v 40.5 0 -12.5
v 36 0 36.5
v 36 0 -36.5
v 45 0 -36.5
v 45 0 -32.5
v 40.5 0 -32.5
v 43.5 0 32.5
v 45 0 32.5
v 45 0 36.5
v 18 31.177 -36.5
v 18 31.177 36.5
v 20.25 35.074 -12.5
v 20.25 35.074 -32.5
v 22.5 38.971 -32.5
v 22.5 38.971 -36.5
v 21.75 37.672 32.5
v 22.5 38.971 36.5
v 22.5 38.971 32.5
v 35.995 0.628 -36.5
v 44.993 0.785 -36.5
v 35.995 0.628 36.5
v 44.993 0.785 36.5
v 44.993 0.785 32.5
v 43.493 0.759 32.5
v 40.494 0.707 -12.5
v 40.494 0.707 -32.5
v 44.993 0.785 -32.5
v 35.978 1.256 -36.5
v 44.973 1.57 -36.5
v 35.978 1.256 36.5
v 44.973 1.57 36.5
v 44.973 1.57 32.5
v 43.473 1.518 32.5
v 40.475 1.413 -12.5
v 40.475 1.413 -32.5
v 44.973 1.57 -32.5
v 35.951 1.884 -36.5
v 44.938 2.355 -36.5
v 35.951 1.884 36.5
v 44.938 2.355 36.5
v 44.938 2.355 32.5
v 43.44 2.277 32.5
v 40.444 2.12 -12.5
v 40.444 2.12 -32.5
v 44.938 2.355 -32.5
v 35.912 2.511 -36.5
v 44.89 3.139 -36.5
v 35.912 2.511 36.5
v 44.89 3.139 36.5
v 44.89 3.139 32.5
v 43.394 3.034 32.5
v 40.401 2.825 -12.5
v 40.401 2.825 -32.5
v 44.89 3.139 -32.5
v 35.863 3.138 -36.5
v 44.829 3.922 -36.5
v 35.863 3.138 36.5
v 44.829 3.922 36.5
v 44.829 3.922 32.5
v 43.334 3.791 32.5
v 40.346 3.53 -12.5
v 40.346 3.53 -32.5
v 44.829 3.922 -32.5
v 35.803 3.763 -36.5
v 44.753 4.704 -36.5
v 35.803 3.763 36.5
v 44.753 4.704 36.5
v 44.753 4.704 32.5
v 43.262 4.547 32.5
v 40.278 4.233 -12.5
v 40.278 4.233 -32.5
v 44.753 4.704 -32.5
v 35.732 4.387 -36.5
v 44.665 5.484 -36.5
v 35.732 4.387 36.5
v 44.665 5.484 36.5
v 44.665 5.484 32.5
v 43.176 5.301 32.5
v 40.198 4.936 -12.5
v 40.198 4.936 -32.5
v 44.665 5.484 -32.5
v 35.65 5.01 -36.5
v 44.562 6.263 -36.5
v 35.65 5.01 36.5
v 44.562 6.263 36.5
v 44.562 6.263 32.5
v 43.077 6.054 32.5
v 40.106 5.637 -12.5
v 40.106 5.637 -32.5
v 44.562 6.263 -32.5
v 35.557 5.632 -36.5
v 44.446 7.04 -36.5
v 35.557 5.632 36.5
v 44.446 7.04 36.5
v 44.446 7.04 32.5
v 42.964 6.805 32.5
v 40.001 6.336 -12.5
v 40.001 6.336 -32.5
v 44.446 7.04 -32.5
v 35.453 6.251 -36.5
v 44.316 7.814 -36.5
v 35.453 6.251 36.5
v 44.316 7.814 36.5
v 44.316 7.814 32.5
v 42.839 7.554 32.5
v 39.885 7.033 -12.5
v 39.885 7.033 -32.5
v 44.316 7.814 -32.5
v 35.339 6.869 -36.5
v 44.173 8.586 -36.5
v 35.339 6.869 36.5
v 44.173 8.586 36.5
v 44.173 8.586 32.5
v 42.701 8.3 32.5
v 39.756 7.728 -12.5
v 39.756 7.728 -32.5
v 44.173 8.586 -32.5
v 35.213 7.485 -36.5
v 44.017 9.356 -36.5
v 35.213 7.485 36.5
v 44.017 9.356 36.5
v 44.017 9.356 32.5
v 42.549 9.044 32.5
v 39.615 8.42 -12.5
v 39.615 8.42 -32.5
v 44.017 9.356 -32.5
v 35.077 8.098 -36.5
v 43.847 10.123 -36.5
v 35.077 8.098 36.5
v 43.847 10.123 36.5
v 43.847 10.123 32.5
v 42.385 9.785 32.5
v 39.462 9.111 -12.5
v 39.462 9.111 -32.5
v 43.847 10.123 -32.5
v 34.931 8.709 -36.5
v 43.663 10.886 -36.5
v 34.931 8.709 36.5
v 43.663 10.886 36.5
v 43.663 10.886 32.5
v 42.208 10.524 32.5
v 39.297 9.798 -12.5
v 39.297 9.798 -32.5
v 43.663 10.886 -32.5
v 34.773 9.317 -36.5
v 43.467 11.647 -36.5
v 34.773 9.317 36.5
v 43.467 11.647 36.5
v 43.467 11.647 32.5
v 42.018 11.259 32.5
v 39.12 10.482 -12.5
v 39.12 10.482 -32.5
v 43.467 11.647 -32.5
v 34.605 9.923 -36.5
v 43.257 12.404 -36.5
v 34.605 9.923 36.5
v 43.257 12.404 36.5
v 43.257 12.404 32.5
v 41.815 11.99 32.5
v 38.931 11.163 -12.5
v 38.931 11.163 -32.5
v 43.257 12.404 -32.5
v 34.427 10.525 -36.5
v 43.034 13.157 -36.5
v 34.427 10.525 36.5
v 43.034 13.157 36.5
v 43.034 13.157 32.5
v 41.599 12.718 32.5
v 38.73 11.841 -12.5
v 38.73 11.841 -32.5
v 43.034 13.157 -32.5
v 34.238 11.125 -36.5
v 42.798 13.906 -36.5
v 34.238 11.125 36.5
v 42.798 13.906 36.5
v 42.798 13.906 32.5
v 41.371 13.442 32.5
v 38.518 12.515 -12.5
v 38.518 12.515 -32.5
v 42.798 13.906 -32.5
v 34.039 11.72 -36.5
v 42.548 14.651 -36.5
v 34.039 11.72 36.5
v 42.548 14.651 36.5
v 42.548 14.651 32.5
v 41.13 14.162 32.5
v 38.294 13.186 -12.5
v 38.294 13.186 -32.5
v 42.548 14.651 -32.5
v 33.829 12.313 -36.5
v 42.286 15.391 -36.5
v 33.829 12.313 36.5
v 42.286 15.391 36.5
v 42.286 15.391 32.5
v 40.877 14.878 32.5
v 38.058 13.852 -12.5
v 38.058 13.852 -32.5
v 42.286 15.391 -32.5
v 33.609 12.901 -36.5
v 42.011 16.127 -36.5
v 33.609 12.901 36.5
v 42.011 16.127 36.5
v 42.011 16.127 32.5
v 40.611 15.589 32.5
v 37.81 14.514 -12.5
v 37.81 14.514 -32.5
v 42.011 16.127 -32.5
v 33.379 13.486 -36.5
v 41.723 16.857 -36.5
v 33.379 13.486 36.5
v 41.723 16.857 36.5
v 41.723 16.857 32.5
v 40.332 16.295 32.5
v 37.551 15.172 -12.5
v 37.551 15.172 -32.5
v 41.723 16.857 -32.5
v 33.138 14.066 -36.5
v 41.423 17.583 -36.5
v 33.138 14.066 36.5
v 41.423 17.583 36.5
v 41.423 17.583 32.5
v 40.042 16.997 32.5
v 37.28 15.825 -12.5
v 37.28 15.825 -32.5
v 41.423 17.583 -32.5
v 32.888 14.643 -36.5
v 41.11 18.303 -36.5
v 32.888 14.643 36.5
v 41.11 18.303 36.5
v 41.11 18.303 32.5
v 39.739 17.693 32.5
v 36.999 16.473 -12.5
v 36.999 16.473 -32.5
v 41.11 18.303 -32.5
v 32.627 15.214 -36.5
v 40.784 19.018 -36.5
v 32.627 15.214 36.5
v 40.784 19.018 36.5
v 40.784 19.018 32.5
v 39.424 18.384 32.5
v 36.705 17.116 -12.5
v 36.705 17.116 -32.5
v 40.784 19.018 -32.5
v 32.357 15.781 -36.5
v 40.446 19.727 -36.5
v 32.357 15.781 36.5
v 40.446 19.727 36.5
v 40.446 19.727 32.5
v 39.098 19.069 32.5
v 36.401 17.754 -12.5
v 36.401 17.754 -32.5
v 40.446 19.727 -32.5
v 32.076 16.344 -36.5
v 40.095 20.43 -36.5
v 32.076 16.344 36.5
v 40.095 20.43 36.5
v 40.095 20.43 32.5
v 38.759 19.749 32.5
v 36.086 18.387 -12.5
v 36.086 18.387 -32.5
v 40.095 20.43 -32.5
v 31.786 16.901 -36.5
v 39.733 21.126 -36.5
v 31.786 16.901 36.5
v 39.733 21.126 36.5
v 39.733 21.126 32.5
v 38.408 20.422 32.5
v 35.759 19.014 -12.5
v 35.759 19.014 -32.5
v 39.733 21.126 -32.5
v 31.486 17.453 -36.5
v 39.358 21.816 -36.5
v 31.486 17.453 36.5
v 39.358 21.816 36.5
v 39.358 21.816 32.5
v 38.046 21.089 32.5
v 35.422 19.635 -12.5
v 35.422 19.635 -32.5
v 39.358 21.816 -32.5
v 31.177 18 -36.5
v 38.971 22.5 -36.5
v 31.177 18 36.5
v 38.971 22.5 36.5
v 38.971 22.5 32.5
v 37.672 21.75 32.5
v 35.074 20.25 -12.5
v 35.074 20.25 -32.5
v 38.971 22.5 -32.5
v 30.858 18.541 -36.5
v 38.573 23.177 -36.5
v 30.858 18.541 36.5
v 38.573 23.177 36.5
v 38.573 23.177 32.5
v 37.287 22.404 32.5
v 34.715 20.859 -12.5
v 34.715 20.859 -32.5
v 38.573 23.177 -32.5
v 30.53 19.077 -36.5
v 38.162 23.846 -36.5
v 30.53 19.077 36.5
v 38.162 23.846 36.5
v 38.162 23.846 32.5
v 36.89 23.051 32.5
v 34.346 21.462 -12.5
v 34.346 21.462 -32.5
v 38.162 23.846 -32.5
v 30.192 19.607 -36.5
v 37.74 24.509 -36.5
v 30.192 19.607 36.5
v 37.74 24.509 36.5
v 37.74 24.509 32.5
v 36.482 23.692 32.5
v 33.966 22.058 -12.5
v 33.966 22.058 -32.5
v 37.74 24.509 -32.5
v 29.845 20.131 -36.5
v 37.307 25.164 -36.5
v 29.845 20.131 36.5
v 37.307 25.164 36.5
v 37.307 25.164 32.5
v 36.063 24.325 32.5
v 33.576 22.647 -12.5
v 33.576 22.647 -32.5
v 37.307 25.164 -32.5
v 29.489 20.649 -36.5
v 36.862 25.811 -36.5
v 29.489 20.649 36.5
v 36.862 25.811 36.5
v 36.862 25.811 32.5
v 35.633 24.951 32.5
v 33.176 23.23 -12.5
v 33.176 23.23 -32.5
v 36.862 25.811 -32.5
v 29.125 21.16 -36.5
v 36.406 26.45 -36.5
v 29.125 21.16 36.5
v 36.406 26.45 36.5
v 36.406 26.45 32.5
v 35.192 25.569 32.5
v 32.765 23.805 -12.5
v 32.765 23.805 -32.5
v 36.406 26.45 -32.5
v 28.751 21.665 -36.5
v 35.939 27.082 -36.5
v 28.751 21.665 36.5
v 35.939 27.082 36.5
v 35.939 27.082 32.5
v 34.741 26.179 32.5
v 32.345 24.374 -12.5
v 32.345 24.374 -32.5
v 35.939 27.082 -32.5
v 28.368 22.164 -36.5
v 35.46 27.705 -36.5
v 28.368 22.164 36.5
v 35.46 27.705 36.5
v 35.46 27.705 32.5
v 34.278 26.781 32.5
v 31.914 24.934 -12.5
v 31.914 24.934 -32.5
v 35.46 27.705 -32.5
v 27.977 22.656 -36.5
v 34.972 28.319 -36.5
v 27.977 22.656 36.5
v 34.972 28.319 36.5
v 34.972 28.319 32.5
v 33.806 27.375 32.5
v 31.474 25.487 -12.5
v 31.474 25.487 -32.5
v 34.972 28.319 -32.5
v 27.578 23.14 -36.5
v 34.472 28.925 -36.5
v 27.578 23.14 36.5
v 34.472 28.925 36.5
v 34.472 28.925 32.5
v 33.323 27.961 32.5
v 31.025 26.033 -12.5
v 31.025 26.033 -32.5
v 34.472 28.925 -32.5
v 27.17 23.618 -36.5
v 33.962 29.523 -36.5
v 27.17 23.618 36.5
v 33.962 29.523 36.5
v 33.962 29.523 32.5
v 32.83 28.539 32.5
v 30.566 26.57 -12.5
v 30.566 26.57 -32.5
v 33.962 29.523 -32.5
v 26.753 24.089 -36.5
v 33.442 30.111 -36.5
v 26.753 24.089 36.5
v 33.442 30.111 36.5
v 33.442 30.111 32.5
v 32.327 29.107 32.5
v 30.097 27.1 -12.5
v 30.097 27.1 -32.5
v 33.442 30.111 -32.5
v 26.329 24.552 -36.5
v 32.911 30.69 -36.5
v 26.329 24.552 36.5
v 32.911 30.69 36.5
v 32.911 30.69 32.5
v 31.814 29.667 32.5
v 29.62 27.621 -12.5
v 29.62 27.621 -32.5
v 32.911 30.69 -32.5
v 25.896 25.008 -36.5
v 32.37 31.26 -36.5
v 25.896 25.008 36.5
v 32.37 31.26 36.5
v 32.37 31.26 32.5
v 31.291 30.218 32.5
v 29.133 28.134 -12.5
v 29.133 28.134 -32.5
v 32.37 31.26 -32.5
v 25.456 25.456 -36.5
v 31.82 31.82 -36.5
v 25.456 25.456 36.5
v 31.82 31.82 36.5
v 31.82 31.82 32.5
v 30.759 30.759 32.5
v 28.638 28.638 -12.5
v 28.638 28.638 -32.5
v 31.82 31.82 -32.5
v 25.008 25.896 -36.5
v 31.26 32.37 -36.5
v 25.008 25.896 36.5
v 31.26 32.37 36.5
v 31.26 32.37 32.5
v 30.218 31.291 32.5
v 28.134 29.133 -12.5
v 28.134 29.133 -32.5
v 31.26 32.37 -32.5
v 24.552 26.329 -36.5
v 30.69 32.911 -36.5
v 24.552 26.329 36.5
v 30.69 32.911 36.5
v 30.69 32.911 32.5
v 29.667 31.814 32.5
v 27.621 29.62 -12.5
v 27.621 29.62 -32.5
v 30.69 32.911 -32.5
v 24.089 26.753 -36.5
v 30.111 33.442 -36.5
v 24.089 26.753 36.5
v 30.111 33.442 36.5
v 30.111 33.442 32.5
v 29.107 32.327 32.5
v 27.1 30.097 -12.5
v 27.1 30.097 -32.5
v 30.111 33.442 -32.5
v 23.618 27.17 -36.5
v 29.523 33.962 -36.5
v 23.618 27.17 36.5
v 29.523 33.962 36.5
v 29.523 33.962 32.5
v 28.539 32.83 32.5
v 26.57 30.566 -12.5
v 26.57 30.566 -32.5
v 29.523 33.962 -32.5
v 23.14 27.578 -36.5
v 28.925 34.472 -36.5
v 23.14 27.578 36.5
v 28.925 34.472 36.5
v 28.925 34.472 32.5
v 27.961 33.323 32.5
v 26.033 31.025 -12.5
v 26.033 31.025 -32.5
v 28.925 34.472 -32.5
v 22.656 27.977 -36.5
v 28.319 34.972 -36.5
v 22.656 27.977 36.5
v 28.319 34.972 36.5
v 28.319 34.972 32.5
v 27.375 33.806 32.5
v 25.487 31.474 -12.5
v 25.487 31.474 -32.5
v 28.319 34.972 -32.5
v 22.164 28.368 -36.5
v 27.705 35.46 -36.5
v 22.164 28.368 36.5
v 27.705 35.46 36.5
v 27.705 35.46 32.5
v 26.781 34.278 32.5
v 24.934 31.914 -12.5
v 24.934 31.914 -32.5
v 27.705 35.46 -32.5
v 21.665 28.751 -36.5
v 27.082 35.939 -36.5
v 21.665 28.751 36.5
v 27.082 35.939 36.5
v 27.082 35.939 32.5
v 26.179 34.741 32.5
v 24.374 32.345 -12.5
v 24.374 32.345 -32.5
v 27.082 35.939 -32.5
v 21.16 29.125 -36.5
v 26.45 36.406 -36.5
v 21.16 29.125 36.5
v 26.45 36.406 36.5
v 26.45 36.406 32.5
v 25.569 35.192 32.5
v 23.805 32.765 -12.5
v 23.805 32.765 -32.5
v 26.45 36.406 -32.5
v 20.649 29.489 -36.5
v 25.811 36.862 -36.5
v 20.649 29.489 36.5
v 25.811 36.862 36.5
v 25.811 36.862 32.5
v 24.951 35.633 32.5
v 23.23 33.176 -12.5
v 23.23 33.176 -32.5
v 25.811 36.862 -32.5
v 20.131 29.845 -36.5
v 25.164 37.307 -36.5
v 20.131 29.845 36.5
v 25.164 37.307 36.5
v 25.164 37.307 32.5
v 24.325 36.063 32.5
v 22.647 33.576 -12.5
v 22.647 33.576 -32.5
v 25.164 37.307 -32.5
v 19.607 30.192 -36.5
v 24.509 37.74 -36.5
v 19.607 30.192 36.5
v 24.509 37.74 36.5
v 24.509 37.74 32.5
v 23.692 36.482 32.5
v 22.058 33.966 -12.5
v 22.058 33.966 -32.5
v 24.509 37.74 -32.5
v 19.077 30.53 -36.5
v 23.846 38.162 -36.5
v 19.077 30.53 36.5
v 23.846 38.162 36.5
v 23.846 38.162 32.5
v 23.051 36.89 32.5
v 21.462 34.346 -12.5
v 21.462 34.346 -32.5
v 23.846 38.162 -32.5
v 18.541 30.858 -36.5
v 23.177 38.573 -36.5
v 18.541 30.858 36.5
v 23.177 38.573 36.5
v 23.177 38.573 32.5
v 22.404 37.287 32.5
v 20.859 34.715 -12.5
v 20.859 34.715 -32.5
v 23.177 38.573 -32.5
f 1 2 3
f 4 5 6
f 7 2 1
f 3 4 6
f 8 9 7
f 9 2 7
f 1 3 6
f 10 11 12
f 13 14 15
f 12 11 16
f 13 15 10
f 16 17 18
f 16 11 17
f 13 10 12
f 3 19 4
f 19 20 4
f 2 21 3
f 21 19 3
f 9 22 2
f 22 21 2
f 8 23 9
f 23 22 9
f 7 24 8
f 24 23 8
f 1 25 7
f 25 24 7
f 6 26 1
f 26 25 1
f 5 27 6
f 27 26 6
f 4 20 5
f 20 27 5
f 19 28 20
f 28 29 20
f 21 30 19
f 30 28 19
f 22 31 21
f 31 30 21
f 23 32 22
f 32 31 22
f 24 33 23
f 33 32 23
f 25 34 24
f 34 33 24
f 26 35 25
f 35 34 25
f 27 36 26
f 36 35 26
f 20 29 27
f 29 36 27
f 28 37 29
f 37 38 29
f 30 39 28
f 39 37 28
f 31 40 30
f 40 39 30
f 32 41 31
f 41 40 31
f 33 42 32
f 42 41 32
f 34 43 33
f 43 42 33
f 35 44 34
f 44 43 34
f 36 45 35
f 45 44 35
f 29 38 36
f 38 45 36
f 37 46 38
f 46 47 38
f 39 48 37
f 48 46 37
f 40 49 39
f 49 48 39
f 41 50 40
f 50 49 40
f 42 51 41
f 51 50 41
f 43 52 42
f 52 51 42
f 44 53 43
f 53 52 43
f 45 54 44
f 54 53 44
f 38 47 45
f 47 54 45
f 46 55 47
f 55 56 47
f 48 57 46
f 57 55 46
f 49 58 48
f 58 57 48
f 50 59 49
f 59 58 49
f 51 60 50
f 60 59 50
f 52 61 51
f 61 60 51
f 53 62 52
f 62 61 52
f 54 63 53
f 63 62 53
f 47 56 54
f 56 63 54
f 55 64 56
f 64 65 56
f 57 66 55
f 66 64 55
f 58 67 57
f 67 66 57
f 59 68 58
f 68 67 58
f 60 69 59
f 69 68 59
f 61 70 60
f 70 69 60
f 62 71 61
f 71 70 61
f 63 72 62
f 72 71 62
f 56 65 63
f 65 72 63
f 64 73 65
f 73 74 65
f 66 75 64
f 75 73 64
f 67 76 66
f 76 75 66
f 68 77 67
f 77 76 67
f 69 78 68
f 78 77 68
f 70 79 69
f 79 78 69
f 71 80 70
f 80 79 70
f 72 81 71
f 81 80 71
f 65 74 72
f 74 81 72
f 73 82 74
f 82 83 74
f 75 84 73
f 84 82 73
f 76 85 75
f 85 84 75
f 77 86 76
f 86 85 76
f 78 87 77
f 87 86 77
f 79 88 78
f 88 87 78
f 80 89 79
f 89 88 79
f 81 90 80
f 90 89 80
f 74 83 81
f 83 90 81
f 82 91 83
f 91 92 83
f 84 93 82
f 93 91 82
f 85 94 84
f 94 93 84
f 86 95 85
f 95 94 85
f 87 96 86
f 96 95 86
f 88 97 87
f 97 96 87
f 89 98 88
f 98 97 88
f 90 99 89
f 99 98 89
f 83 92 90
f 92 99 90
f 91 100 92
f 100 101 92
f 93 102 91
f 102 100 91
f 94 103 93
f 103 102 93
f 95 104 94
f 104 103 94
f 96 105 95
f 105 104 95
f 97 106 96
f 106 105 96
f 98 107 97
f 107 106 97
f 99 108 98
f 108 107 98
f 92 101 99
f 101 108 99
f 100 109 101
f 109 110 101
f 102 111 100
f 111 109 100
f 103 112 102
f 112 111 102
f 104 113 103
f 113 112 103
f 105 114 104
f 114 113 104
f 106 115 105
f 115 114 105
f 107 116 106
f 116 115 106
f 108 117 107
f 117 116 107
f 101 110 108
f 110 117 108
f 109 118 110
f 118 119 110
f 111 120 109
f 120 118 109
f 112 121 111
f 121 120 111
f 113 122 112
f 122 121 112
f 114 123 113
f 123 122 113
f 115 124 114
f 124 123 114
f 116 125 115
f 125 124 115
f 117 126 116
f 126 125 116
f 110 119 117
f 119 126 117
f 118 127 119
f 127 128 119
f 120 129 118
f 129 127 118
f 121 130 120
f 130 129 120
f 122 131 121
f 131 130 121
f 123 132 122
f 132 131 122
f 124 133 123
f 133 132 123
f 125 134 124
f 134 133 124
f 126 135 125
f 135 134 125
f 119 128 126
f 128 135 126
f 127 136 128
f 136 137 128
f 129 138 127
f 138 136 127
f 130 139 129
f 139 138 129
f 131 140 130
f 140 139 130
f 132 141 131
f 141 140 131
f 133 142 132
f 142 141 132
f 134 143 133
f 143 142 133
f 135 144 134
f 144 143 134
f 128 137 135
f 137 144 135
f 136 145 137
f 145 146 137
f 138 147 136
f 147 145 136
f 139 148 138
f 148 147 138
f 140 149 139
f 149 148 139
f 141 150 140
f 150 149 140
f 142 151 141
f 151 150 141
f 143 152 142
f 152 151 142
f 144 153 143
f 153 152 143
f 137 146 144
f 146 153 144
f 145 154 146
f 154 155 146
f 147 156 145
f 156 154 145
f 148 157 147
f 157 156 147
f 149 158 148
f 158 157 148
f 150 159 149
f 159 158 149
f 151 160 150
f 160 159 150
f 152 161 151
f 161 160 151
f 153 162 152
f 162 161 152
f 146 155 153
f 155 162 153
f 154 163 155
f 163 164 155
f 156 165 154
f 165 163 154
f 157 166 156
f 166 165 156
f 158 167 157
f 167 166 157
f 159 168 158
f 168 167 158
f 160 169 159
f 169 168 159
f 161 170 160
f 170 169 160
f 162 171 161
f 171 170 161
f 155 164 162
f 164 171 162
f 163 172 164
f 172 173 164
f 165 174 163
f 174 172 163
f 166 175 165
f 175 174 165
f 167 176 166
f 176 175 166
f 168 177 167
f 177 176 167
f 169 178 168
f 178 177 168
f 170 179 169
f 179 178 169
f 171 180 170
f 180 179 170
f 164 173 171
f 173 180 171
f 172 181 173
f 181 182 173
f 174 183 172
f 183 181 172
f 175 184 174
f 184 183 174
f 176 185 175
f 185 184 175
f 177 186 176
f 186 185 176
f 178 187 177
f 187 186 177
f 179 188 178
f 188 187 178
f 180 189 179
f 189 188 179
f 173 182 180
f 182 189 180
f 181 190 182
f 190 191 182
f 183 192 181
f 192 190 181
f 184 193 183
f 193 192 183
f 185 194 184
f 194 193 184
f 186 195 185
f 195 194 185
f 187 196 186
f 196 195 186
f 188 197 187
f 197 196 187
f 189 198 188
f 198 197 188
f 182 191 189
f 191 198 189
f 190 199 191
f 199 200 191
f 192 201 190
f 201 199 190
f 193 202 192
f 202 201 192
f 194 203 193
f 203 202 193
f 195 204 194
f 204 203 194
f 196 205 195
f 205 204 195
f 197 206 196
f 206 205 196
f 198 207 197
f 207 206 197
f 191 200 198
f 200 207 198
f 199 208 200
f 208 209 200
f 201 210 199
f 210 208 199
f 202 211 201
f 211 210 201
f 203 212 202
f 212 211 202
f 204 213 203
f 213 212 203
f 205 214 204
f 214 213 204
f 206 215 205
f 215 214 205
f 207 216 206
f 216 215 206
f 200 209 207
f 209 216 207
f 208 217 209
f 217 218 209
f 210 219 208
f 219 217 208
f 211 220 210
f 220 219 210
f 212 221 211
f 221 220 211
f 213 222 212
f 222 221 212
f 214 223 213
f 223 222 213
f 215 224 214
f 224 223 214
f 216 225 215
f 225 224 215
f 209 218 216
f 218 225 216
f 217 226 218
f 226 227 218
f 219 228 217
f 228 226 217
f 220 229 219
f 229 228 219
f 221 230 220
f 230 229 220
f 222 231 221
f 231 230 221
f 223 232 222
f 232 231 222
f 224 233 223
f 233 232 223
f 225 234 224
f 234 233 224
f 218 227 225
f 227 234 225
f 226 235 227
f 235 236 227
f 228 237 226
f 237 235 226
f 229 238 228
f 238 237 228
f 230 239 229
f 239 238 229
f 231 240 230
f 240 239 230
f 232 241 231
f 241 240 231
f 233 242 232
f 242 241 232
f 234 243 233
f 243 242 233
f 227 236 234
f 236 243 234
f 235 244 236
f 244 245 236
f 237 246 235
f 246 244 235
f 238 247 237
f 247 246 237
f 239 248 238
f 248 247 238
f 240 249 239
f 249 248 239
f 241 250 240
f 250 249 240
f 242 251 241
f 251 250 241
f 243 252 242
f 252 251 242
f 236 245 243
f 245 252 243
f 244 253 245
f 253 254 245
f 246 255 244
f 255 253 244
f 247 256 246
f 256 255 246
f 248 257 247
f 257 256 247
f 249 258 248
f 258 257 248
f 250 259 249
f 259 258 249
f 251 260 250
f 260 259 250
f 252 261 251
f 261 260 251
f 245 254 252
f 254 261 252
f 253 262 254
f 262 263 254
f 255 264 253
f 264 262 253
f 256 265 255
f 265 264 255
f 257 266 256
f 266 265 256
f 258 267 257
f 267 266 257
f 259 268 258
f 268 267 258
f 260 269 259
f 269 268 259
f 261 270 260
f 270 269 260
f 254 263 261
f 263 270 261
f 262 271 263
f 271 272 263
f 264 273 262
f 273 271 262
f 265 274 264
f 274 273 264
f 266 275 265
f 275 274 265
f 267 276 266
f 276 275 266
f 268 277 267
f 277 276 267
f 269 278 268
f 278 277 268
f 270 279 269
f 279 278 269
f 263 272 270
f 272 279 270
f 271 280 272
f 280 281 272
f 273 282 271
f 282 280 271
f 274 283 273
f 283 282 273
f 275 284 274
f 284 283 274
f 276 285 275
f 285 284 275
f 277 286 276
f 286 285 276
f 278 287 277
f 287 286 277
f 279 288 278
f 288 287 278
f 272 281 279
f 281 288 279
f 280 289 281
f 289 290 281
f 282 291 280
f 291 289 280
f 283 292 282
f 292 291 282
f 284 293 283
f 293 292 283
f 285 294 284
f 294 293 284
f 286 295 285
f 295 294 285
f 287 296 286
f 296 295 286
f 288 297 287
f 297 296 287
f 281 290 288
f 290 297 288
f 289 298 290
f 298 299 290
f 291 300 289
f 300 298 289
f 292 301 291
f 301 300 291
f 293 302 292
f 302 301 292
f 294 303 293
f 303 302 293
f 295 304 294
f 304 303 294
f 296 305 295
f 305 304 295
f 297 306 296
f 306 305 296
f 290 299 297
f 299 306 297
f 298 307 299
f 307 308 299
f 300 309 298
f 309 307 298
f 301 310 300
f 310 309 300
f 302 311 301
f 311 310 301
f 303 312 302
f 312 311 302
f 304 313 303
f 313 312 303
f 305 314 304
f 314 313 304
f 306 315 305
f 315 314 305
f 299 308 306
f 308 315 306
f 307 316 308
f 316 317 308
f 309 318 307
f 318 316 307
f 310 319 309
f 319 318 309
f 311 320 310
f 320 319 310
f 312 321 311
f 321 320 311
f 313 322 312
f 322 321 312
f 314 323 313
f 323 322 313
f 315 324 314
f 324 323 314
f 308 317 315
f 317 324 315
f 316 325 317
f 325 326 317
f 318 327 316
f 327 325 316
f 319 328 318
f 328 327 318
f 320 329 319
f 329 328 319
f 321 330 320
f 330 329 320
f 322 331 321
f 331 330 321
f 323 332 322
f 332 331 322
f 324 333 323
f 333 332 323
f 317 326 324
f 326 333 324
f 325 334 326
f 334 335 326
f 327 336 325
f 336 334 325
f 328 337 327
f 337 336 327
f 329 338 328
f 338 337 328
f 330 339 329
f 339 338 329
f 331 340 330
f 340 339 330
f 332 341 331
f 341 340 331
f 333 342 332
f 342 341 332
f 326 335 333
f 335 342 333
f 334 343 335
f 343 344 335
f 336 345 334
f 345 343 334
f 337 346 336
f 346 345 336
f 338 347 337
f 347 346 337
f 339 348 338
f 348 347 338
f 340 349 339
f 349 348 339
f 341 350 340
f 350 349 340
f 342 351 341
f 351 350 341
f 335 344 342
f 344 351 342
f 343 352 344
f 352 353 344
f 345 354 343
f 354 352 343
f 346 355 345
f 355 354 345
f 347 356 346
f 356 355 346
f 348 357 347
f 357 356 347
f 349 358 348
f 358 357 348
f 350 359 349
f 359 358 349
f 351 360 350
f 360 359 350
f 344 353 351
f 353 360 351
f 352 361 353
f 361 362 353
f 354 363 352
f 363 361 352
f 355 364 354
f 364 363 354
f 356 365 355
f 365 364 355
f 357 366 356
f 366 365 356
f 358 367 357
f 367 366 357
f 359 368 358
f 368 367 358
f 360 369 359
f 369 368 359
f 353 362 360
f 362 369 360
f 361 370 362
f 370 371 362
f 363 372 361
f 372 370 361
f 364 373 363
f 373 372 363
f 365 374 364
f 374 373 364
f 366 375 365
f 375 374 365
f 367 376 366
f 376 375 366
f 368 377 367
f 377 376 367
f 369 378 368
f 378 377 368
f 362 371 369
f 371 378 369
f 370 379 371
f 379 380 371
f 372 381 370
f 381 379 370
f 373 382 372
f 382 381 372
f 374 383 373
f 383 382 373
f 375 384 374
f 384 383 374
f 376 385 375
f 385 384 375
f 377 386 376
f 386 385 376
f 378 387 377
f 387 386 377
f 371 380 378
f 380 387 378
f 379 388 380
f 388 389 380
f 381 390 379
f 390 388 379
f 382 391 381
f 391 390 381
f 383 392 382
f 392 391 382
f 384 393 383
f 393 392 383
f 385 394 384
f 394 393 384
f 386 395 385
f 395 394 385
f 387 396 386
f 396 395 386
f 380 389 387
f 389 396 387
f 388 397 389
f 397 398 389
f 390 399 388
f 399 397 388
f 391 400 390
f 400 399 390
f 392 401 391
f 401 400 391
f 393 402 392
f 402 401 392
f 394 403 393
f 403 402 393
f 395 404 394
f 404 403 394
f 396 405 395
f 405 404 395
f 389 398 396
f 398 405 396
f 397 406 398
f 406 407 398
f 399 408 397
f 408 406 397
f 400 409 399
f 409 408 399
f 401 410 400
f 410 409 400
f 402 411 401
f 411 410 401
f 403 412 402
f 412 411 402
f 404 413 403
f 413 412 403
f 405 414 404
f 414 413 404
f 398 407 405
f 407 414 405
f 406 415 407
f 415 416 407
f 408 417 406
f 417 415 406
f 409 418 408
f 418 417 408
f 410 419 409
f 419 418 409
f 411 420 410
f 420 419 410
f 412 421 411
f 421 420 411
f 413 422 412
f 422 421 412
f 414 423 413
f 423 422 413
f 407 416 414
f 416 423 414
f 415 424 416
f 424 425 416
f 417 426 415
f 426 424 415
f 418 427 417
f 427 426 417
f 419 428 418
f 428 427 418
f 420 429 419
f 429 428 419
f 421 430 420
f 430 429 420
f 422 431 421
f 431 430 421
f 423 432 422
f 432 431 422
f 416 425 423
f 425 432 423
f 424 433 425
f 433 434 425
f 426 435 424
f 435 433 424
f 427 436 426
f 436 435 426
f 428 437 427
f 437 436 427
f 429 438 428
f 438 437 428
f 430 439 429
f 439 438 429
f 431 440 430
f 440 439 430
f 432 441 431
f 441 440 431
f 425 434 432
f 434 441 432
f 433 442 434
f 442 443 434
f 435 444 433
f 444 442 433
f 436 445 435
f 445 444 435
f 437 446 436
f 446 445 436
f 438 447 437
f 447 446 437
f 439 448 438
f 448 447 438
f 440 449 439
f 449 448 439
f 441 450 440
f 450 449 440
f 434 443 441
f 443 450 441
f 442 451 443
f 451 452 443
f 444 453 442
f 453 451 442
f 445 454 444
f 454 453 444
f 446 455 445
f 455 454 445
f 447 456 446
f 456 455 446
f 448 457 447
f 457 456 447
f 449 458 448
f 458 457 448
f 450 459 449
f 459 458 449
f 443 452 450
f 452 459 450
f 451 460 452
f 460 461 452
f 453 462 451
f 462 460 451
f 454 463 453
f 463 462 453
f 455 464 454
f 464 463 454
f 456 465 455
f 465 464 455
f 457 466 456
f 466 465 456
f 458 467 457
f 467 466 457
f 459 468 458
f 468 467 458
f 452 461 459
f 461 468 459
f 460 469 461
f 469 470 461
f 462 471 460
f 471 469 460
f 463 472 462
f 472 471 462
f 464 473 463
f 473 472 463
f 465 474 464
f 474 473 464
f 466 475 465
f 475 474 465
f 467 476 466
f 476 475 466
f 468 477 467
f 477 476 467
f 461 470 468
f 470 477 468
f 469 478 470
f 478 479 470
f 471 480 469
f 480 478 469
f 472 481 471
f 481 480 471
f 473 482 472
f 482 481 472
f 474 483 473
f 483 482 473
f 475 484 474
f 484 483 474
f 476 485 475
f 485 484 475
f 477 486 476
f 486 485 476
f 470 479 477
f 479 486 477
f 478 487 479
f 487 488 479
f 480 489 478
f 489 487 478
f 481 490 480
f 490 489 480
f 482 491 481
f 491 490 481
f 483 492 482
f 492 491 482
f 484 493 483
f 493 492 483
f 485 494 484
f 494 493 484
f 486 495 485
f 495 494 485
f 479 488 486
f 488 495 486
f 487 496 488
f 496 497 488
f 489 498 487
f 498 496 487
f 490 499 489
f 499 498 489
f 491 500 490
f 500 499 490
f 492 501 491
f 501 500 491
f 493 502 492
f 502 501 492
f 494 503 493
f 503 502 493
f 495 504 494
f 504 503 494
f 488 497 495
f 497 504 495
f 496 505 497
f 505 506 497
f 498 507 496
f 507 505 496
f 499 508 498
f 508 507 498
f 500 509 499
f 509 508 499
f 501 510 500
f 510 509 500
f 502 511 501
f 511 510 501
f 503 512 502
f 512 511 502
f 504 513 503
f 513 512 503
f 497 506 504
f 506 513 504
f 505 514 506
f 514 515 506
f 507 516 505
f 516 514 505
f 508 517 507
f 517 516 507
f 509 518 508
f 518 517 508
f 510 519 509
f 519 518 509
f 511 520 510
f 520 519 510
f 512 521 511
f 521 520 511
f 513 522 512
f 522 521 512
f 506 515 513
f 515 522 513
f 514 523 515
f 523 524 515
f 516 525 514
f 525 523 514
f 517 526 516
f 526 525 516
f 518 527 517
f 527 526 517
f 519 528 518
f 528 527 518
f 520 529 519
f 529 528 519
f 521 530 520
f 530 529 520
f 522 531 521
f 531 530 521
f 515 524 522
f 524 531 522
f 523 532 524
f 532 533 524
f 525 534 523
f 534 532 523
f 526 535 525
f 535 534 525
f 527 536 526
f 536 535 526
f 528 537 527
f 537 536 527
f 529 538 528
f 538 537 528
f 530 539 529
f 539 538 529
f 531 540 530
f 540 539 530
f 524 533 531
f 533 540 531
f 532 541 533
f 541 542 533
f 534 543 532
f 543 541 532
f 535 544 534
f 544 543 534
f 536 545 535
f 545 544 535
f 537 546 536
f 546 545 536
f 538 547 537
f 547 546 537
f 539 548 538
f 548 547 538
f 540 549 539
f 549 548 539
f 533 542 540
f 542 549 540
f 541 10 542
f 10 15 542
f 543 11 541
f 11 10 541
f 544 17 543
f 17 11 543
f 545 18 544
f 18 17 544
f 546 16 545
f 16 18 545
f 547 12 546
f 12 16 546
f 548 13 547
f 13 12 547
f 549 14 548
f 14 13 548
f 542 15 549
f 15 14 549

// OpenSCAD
inner_d = 72;
outer_d1 = 81;
outer_d2 = 87;
outer_d3 = 90;

height = 65;
t=4;

rotate_extrude(angle=60,$fn = 360) { polygon( 
        points=[
            [inner_d/2,-height/2-t],
            [outer_d3/2,-height/2-t],
            [outer_d3/2,-height/2],
            [outer_d1/2,-height/2],
            [outer_d1/2,-height/2+20],
            [outer_d2/2,height/2],
            [outer_d3/2,height/2],
            [outer_d3/2,height/2+t],
            [inner_d/2,height/2+t],
        ] 
    );}
